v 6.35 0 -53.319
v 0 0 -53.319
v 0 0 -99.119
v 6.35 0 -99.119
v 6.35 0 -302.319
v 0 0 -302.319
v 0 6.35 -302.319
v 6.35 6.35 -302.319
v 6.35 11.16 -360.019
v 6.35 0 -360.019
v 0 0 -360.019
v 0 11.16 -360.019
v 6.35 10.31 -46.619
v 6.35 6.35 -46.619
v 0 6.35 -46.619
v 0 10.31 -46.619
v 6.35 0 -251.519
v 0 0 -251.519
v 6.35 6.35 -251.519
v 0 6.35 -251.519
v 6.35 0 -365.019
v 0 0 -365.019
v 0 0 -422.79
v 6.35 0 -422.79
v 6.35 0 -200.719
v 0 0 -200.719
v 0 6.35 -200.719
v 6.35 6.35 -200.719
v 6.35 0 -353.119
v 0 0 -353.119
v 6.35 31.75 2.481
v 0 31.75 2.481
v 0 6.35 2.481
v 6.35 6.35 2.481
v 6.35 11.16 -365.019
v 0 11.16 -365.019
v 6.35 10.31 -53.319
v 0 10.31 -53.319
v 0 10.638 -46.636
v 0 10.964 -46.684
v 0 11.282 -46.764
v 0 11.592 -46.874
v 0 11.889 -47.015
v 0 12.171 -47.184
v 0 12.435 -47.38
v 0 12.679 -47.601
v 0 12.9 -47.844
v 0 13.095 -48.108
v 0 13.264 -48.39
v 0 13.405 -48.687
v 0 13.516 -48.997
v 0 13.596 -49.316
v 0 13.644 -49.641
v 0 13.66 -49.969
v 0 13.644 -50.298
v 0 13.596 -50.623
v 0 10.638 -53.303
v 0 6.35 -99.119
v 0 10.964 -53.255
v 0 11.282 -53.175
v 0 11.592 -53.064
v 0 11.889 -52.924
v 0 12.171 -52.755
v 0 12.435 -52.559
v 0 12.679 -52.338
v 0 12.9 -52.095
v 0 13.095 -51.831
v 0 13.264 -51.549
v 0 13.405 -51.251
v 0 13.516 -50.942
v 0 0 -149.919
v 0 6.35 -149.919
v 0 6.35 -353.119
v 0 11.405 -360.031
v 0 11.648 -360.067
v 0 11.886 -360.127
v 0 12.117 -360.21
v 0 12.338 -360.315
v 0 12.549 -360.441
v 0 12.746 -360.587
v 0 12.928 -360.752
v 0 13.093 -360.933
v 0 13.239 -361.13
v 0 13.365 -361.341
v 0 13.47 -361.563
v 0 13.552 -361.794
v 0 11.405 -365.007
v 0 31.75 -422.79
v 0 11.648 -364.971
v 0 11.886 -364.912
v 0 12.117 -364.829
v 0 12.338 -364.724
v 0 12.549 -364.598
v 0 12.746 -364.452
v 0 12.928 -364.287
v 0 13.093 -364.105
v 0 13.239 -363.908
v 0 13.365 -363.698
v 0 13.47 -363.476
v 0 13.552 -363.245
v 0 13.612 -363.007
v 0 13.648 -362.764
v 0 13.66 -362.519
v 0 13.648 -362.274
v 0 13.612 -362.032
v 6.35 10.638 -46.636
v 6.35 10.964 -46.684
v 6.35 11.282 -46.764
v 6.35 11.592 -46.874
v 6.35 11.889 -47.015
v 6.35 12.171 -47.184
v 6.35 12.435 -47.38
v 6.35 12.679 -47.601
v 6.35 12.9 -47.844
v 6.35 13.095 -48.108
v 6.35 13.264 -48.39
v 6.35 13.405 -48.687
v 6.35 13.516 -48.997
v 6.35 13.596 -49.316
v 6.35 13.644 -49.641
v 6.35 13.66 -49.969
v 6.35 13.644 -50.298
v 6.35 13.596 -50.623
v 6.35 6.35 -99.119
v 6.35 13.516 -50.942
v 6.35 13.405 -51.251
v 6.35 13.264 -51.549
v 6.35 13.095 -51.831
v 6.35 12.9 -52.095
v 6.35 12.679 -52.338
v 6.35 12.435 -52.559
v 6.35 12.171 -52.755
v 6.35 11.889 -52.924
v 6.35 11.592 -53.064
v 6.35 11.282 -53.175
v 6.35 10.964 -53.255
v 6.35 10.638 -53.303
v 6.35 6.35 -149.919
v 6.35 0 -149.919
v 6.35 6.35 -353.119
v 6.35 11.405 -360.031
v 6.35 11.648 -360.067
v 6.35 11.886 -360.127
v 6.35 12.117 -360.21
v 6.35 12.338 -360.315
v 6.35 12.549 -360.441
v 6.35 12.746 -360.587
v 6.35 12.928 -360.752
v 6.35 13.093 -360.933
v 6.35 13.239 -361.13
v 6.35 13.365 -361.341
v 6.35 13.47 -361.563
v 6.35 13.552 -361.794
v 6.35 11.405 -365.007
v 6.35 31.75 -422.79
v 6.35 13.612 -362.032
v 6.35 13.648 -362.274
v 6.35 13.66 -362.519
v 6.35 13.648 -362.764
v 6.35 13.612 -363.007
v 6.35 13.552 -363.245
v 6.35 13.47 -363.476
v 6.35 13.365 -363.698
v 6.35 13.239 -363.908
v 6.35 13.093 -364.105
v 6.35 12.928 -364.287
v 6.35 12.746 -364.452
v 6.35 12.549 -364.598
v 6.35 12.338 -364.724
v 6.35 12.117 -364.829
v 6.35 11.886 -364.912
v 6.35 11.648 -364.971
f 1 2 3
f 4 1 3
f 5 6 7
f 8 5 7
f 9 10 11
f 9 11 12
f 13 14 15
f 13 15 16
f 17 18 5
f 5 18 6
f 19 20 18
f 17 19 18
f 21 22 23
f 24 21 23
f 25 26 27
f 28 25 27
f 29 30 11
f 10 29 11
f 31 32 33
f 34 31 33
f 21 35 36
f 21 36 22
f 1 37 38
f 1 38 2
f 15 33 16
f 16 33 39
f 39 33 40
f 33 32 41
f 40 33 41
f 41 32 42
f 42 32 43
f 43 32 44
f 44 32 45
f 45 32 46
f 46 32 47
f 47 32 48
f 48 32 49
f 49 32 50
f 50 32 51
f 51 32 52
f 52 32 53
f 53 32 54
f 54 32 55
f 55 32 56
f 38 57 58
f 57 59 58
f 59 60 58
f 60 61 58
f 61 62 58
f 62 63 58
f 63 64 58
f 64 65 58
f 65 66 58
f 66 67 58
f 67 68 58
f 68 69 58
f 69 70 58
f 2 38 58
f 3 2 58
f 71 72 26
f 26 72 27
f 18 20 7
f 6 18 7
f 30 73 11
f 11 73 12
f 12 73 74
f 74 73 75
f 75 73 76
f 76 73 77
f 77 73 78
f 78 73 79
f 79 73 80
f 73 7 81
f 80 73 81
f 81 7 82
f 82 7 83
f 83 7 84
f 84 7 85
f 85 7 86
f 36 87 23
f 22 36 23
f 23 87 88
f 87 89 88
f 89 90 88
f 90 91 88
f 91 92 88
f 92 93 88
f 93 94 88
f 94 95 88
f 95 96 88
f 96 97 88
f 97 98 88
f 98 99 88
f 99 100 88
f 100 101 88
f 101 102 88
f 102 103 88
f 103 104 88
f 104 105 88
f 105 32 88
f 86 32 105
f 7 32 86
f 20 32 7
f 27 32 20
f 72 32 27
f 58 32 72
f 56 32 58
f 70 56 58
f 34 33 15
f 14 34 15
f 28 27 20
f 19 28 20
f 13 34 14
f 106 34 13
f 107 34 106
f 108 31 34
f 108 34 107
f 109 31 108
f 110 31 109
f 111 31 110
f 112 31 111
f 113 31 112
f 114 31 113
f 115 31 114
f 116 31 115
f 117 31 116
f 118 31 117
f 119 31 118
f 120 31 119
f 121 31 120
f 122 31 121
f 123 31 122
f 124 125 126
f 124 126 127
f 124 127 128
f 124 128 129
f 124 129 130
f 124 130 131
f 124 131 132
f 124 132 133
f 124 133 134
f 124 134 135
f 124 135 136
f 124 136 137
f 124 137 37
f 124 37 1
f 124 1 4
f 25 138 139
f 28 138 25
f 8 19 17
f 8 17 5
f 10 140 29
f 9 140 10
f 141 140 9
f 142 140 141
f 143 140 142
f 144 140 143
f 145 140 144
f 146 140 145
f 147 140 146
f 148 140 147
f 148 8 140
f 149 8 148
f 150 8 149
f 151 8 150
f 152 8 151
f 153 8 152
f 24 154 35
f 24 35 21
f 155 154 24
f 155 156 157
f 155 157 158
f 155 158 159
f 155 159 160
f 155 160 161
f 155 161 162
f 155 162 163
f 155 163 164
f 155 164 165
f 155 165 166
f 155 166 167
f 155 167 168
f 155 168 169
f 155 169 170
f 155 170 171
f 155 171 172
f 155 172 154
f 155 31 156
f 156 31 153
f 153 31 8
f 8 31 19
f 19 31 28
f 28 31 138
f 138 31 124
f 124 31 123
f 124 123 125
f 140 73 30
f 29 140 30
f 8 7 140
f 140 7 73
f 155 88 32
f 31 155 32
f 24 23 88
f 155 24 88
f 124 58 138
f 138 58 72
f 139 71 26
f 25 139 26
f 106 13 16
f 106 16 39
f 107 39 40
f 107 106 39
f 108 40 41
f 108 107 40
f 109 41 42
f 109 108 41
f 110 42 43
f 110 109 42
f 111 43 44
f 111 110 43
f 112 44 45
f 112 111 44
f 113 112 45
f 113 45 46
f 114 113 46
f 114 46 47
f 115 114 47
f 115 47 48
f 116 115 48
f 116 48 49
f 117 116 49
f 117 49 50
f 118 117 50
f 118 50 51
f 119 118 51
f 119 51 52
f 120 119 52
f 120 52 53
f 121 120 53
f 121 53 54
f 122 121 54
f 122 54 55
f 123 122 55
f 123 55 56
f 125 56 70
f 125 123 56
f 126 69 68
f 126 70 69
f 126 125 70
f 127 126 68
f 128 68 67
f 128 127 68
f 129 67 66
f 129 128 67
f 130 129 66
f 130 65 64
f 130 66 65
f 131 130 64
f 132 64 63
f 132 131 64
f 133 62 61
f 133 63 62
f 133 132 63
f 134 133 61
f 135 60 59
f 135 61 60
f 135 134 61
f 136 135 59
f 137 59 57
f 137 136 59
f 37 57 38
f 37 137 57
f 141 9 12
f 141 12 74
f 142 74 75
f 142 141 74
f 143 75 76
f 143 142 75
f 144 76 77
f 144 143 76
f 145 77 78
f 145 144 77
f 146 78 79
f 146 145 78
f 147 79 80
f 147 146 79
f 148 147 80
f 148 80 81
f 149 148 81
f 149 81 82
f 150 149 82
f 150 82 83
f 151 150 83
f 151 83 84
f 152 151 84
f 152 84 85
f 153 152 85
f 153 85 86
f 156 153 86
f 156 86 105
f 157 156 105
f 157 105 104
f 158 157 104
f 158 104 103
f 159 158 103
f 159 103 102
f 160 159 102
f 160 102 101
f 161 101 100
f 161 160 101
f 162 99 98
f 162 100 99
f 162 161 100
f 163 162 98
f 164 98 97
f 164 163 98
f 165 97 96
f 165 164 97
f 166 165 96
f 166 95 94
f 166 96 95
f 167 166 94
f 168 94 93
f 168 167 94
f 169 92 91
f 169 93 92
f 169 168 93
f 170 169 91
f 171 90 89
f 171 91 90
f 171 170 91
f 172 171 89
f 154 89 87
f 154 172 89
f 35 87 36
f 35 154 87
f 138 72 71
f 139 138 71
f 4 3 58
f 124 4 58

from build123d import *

# Parameters (mm, degrees)
BOSS_EXTRUDE1_DEPTH = 6.35
CUT_EXTRUDE1_REACH  = 426.028
CUT_EXTRUDE2_DEPTH  = 425.027574582


with BuildPart() as part:
    # Sketch2 → Boss-Extrude1 (new body)
    with BuildSketch(Plane(origin=(0, 0, 0), x_dir=(0, 0, -1), z_dir=(1, 0, 0))):
        Polygon((48.319405744, 0), (99.119405744, 0), (99.119405744, 6.35), (149.919405744, 6.35), (149.919405744, 0), (200.719405744, 0), (200.719405744, 6.35), (251.519405744, 6.35), (251.519405744, 0), (302.319405744, 0), (302.319405744, 6.35), (353.119405744, 6.35), (353.119405744, 0), (422.789544579, 0), (422.789544579, 31.75), (-2.480594256, 31.75), (-2.480594256, 6.35), (48.319405744, 6.35), align=None)
    extrude(amount=BOSS_EXTRUDE1_DEPTH)

    # Sketch3 → Cut-Extrude1 (cut, up to next)
    with BuildSketch(Plane(origin=(6.35, 0, 0), x_dir=(0, 0, -1), z_dir=(1, 0, 0)), mode=Mode.PRIVATE) as cut_extrude1_sk1:
        with BuildLine():
            Line((365.019405744, 11.16), (365.019405744, -0.034586793))
            Line((365.019405744, -0.034586793), (360.019405744, -0.034586793))
            Line((360.019405744, -0.034586793), (360.019405744, 11.16))
            ThreePointArc((360.019405744, 11.16), (362.519405744, 13.66), (365.019405744, 11.16))
        make_face()
    cut_extrude1_tool1 = extrude(cut_extrude1_sk1.sketch, amount=-CUT_EXTRUDE1_REACH, mode=Mode.PRIVATE) & part.part
    add(cut_extrude1_tool1.solids().sort_by_distance((6.35, 6.556286, -362.519406))[0], mode=Mode.SUBTRACT)

    # Sketch4 → Cut-Extrude2 (cut, through all)
    with BuildSketch(Plane(origin=(6.35, 0, 0), x_dir=(0, 0, -1), z_dir=(1, 0, 0))):
        with BuildLine():
            Line((53.319405744, 10.31), (53.319405744, 0))
            Line((53.319405744, 0), (48.319405744, 0))
            Line((48.319405744, 0), (48.319405744, 6.35))
            Line((48.319405744, 6.35), (46.619405744, 6.35))
            Line((46.619405744, 6.35), (46.619405744, 10.31))
            ThreePointArc((46.619405744, 10.31), (49.969405744, 13.66), (53.319405744, 10.31))
        make_face()
    extrude(amount=-CUT_EXTRUDE2_DEPTH, mode=Mode.SUBTRACT)


solid = part.part
